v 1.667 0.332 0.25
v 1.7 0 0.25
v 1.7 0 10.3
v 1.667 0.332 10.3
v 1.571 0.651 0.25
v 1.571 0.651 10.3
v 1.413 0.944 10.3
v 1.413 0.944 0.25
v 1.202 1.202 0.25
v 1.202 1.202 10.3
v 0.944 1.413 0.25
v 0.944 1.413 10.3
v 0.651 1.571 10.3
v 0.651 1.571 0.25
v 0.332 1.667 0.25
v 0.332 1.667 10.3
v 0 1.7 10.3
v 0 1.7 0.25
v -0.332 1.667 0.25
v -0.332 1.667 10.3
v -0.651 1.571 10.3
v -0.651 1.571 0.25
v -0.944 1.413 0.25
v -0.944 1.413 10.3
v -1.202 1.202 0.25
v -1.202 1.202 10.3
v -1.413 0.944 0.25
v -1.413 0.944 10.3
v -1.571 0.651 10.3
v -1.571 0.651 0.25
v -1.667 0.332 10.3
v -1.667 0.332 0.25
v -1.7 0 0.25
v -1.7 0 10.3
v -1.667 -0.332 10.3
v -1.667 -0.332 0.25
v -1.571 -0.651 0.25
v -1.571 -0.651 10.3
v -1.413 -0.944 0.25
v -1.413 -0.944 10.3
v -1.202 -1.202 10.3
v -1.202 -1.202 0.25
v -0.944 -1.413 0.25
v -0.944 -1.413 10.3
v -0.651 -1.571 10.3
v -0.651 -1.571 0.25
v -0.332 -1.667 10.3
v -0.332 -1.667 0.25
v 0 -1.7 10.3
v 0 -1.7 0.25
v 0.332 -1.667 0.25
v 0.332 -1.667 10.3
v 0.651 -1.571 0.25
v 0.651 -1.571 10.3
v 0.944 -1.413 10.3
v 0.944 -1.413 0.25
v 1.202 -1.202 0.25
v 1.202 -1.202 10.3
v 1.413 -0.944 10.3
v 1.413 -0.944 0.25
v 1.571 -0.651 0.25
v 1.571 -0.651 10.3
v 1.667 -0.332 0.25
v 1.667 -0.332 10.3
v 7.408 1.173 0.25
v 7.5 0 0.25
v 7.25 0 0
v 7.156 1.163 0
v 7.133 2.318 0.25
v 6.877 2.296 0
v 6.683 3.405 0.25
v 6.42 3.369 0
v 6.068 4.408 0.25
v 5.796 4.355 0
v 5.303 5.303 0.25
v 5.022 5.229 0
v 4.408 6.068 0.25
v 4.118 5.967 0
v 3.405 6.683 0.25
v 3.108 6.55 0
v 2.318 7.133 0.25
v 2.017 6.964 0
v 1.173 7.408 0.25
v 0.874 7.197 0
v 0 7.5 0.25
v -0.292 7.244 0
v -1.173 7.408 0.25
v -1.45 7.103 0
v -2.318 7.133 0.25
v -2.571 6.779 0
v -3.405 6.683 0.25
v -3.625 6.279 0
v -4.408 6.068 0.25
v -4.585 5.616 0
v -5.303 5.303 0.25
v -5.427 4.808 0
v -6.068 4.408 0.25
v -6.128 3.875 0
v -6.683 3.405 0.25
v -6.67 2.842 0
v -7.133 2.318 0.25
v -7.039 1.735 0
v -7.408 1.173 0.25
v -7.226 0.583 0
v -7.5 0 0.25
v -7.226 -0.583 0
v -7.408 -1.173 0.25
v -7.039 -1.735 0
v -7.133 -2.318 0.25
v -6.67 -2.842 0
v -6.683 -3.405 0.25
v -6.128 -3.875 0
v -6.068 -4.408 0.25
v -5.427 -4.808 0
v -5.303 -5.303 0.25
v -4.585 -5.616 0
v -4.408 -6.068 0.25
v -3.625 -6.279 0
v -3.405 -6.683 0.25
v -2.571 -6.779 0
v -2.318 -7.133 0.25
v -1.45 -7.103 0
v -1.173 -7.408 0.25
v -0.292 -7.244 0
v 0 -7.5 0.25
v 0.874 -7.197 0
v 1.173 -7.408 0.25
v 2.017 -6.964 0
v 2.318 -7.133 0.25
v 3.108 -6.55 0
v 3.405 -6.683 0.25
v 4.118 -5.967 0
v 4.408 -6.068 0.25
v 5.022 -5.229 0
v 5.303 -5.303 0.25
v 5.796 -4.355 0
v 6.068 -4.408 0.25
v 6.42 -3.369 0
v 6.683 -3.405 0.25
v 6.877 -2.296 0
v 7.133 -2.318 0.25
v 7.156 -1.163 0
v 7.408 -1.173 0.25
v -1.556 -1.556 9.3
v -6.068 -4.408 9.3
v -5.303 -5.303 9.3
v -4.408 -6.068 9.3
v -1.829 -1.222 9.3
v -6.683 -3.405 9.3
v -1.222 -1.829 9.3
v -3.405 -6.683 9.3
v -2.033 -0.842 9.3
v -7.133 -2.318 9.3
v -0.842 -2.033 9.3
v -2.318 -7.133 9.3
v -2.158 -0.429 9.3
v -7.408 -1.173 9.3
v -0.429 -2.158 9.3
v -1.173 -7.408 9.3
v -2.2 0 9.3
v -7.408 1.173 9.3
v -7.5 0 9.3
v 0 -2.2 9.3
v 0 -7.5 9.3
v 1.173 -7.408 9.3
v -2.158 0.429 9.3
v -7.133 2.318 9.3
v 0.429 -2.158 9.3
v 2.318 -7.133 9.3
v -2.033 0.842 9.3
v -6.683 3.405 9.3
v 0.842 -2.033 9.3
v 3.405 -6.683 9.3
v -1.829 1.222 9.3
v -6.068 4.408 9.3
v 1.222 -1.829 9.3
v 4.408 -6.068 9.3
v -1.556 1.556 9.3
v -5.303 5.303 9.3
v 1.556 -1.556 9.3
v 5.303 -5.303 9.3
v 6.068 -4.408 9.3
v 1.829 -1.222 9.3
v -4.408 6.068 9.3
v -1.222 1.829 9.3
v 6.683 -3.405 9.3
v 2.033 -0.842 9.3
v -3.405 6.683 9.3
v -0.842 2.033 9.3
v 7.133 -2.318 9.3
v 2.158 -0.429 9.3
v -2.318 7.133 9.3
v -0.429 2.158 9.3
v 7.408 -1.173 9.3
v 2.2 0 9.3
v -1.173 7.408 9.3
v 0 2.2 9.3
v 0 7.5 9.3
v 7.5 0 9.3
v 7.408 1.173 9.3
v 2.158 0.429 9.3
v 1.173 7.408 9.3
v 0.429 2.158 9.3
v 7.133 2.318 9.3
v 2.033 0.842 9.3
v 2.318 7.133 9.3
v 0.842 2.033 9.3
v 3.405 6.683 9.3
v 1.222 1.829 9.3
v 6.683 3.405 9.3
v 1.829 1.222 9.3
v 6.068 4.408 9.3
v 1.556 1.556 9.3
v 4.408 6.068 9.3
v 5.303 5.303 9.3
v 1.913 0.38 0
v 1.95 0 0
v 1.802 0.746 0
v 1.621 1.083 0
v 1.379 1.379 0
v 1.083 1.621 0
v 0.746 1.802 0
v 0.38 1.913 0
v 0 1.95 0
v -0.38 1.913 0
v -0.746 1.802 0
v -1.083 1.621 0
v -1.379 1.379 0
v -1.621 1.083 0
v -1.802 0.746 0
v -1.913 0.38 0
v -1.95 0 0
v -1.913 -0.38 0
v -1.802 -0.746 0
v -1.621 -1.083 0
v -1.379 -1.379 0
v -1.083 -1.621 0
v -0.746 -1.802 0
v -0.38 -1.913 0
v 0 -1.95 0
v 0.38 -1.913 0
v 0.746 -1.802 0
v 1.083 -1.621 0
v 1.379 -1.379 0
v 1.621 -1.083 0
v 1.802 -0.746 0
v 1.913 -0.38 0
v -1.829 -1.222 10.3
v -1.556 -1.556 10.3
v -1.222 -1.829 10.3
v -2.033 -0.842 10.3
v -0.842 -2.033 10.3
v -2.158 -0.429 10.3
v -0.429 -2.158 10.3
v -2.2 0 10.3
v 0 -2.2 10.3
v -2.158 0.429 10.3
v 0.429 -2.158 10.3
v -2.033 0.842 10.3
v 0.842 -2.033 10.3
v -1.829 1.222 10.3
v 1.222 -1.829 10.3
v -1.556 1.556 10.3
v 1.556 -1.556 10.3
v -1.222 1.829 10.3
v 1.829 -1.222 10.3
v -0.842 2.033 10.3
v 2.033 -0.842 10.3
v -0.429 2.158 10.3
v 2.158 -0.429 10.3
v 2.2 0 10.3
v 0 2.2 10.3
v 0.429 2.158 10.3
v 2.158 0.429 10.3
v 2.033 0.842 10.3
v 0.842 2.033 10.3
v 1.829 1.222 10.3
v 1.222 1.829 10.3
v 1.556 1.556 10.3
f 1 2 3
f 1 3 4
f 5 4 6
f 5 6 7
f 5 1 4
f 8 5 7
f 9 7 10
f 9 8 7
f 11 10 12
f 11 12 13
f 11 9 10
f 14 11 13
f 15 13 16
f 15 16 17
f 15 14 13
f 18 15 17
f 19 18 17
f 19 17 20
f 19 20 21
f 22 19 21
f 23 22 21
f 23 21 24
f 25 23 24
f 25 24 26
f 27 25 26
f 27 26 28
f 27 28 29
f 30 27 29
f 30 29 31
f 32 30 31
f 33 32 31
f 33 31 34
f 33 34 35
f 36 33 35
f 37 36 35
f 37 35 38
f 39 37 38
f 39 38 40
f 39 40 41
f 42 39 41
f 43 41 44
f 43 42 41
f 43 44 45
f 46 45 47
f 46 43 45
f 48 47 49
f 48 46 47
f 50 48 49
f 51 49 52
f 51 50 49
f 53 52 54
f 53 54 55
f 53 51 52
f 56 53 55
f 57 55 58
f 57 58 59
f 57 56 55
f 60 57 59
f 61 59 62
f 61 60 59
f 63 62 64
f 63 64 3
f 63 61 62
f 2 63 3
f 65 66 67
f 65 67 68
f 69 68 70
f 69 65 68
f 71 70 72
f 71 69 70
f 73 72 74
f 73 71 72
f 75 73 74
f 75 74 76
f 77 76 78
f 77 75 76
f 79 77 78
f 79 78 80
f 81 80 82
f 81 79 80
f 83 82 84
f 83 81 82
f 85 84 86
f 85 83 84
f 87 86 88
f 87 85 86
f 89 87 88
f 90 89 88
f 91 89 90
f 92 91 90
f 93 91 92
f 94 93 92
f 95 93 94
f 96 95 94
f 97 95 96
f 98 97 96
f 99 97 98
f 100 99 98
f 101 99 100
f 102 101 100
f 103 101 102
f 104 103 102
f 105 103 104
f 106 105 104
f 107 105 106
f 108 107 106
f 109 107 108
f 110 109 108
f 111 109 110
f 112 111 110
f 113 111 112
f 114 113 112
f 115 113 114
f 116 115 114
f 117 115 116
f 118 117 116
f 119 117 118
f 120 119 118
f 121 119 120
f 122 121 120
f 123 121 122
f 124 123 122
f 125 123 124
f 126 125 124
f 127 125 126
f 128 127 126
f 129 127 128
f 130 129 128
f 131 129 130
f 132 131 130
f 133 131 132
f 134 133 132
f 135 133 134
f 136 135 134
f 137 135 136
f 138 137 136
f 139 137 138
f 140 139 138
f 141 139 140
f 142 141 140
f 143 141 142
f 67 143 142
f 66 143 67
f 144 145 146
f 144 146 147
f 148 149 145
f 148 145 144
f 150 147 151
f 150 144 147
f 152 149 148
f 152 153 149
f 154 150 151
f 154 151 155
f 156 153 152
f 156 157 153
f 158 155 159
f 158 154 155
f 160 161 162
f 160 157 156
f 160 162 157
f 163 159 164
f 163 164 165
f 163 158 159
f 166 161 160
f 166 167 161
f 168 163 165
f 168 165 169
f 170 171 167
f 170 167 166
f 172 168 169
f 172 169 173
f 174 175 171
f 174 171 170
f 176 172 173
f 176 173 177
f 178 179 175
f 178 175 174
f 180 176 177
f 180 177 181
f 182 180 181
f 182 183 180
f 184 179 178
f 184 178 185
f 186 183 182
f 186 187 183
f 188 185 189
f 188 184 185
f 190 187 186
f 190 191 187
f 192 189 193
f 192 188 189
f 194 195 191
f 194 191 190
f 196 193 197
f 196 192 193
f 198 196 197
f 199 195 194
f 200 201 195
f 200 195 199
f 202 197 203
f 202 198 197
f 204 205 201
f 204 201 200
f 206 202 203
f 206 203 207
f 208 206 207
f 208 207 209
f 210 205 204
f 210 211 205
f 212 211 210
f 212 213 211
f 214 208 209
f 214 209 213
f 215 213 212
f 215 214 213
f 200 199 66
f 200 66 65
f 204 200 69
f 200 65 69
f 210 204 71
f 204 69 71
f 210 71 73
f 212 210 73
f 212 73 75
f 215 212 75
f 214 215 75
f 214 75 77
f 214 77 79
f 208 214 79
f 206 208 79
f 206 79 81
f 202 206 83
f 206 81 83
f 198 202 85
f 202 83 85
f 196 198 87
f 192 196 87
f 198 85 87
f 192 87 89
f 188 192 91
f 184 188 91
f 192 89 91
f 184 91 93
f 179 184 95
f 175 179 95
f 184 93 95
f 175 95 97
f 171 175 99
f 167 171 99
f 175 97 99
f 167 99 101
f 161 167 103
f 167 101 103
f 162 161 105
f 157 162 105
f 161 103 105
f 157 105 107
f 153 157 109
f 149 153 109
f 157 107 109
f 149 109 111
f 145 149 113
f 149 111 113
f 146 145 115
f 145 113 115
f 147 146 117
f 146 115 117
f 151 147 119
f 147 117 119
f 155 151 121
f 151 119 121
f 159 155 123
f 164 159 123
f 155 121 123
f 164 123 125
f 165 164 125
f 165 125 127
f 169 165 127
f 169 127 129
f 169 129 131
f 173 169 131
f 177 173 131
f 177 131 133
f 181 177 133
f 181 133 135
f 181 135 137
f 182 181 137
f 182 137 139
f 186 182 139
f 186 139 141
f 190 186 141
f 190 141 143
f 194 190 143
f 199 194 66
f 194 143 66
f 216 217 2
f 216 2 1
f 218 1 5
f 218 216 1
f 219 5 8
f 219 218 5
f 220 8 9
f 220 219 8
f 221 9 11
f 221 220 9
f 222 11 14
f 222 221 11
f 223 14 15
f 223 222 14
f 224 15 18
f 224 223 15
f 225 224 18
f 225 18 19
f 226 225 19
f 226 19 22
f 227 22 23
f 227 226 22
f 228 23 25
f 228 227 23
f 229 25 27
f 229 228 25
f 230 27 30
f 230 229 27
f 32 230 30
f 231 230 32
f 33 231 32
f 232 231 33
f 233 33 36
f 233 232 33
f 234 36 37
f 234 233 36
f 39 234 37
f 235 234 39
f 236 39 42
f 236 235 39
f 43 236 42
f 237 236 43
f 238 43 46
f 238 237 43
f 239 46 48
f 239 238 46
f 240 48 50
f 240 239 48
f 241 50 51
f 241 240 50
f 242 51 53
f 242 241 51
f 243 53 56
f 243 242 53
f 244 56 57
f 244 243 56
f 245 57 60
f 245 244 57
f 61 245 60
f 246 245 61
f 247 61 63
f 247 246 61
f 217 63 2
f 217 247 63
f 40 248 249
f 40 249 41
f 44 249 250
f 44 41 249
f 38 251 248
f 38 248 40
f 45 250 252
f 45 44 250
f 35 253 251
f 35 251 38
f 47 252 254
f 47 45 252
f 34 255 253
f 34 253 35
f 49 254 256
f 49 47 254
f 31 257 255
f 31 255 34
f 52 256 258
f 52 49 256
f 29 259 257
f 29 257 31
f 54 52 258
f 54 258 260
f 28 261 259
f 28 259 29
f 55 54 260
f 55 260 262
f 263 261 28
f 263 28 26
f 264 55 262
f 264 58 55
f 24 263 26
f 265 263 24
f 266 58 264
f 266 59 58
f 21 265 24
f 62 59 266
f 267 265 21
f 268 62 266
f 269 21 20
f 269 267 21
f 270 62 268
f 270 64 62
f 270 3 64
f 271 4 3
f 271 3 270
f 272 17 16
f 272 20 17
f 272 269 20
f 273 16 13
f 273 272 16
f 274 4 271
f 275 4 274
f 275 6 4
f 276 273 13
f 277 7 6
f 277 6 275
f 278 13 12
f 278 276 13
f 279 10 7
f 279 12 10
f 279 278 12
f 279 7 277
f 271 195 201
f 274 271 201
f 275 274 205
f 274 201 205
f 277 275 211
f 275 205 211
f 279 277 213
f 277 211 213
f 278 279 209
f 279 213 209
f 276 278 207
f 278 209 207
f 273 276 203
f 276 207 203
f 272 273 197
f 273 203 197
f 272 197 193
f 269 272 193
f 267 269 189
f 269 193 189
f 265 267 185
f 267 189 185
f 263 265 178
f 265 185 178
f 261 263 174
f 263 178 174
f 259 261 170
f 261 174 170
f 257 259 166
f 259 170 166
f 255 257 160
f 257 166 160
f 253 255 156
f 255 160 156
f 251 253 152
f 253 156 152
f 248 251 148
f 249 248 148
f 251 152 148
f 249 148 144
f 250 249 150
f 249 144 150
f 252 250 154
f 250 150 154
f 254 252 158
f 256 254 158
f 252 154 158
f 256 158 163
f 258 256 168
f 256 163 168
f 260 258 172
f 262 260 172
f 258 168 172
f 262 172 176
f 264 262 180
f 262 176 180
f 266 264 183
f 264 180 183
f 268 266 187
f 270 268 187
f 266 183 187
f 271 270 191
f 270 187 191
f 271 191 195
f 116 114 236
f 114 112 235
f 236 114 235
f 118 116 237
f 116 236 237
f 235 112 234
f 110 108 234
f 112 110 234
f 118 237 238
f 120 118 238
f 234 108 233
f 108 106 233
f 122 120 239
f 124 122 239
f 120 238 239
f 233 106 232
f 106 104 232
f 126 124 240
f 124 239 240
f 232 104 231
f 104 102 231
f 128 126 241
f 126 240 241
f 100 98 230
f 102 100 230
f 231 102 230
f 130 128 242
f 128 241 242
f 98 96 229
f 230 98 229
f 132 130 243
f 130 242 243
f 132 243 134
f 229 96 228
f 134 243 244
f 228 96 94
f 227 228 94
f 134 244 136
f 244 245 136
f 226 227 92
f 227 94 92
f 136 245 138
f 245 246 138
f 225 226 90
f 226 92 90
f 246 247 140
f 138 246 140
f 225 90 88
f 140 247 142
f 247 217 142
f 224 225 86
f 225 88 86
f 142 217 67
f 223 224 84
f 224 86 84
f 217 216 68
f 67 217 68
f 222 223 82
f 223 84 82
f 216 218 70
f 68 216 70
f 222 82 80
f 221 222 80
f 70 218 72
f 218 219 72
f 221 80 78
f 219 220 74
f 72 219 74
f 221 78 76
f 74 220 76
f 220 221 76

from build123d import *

# Parameters (mm, degrees)
SKETCH1_R           = 7.5
SKETCH1_R_2         = 1.7
BOSS_EXTRUDE1_DEPTH = 9.3
SKETCH2_R           = 2.2
SKETCH2_R_2         = 1.7
BOSS_EXTRUDE2_DEPTH = 1
CHAMFER1_SIZE       = 0.25


with BuildPart() as part:
    # Sketch1 → Boss-Extrude1 (new body)
    with BuildSketch(Plane.XY):
        Circle(SKETCH1_R)
        Circle(SKETCH1_R_2, mode=Mode.SUBTRACT)
    extrude(amount=BOSS_EXTRUDE1_DEPTH)

    # Sketch2 → Boss-Extrude2 (add)
    with BuildSketch(Plane.XY.offset(9.3)):
        Circle(SKETCH2_R)
        Circle(SKETCH2_R_2, mode=Mode.SUBTRACT)
    extrude(amount=BOSS_EXTRUDE2_DEPTH)

    # Chamfer1
    chamfer1_edges = [part.edges().sort_by_distance(p)[0] for p in [
        (-7.5, 0, 0),
        (-1.7, 0, 0),
    ]]
    chamfer(chamfer1_edges, length=CHAMFER1_SIZE)


solid = part.part
